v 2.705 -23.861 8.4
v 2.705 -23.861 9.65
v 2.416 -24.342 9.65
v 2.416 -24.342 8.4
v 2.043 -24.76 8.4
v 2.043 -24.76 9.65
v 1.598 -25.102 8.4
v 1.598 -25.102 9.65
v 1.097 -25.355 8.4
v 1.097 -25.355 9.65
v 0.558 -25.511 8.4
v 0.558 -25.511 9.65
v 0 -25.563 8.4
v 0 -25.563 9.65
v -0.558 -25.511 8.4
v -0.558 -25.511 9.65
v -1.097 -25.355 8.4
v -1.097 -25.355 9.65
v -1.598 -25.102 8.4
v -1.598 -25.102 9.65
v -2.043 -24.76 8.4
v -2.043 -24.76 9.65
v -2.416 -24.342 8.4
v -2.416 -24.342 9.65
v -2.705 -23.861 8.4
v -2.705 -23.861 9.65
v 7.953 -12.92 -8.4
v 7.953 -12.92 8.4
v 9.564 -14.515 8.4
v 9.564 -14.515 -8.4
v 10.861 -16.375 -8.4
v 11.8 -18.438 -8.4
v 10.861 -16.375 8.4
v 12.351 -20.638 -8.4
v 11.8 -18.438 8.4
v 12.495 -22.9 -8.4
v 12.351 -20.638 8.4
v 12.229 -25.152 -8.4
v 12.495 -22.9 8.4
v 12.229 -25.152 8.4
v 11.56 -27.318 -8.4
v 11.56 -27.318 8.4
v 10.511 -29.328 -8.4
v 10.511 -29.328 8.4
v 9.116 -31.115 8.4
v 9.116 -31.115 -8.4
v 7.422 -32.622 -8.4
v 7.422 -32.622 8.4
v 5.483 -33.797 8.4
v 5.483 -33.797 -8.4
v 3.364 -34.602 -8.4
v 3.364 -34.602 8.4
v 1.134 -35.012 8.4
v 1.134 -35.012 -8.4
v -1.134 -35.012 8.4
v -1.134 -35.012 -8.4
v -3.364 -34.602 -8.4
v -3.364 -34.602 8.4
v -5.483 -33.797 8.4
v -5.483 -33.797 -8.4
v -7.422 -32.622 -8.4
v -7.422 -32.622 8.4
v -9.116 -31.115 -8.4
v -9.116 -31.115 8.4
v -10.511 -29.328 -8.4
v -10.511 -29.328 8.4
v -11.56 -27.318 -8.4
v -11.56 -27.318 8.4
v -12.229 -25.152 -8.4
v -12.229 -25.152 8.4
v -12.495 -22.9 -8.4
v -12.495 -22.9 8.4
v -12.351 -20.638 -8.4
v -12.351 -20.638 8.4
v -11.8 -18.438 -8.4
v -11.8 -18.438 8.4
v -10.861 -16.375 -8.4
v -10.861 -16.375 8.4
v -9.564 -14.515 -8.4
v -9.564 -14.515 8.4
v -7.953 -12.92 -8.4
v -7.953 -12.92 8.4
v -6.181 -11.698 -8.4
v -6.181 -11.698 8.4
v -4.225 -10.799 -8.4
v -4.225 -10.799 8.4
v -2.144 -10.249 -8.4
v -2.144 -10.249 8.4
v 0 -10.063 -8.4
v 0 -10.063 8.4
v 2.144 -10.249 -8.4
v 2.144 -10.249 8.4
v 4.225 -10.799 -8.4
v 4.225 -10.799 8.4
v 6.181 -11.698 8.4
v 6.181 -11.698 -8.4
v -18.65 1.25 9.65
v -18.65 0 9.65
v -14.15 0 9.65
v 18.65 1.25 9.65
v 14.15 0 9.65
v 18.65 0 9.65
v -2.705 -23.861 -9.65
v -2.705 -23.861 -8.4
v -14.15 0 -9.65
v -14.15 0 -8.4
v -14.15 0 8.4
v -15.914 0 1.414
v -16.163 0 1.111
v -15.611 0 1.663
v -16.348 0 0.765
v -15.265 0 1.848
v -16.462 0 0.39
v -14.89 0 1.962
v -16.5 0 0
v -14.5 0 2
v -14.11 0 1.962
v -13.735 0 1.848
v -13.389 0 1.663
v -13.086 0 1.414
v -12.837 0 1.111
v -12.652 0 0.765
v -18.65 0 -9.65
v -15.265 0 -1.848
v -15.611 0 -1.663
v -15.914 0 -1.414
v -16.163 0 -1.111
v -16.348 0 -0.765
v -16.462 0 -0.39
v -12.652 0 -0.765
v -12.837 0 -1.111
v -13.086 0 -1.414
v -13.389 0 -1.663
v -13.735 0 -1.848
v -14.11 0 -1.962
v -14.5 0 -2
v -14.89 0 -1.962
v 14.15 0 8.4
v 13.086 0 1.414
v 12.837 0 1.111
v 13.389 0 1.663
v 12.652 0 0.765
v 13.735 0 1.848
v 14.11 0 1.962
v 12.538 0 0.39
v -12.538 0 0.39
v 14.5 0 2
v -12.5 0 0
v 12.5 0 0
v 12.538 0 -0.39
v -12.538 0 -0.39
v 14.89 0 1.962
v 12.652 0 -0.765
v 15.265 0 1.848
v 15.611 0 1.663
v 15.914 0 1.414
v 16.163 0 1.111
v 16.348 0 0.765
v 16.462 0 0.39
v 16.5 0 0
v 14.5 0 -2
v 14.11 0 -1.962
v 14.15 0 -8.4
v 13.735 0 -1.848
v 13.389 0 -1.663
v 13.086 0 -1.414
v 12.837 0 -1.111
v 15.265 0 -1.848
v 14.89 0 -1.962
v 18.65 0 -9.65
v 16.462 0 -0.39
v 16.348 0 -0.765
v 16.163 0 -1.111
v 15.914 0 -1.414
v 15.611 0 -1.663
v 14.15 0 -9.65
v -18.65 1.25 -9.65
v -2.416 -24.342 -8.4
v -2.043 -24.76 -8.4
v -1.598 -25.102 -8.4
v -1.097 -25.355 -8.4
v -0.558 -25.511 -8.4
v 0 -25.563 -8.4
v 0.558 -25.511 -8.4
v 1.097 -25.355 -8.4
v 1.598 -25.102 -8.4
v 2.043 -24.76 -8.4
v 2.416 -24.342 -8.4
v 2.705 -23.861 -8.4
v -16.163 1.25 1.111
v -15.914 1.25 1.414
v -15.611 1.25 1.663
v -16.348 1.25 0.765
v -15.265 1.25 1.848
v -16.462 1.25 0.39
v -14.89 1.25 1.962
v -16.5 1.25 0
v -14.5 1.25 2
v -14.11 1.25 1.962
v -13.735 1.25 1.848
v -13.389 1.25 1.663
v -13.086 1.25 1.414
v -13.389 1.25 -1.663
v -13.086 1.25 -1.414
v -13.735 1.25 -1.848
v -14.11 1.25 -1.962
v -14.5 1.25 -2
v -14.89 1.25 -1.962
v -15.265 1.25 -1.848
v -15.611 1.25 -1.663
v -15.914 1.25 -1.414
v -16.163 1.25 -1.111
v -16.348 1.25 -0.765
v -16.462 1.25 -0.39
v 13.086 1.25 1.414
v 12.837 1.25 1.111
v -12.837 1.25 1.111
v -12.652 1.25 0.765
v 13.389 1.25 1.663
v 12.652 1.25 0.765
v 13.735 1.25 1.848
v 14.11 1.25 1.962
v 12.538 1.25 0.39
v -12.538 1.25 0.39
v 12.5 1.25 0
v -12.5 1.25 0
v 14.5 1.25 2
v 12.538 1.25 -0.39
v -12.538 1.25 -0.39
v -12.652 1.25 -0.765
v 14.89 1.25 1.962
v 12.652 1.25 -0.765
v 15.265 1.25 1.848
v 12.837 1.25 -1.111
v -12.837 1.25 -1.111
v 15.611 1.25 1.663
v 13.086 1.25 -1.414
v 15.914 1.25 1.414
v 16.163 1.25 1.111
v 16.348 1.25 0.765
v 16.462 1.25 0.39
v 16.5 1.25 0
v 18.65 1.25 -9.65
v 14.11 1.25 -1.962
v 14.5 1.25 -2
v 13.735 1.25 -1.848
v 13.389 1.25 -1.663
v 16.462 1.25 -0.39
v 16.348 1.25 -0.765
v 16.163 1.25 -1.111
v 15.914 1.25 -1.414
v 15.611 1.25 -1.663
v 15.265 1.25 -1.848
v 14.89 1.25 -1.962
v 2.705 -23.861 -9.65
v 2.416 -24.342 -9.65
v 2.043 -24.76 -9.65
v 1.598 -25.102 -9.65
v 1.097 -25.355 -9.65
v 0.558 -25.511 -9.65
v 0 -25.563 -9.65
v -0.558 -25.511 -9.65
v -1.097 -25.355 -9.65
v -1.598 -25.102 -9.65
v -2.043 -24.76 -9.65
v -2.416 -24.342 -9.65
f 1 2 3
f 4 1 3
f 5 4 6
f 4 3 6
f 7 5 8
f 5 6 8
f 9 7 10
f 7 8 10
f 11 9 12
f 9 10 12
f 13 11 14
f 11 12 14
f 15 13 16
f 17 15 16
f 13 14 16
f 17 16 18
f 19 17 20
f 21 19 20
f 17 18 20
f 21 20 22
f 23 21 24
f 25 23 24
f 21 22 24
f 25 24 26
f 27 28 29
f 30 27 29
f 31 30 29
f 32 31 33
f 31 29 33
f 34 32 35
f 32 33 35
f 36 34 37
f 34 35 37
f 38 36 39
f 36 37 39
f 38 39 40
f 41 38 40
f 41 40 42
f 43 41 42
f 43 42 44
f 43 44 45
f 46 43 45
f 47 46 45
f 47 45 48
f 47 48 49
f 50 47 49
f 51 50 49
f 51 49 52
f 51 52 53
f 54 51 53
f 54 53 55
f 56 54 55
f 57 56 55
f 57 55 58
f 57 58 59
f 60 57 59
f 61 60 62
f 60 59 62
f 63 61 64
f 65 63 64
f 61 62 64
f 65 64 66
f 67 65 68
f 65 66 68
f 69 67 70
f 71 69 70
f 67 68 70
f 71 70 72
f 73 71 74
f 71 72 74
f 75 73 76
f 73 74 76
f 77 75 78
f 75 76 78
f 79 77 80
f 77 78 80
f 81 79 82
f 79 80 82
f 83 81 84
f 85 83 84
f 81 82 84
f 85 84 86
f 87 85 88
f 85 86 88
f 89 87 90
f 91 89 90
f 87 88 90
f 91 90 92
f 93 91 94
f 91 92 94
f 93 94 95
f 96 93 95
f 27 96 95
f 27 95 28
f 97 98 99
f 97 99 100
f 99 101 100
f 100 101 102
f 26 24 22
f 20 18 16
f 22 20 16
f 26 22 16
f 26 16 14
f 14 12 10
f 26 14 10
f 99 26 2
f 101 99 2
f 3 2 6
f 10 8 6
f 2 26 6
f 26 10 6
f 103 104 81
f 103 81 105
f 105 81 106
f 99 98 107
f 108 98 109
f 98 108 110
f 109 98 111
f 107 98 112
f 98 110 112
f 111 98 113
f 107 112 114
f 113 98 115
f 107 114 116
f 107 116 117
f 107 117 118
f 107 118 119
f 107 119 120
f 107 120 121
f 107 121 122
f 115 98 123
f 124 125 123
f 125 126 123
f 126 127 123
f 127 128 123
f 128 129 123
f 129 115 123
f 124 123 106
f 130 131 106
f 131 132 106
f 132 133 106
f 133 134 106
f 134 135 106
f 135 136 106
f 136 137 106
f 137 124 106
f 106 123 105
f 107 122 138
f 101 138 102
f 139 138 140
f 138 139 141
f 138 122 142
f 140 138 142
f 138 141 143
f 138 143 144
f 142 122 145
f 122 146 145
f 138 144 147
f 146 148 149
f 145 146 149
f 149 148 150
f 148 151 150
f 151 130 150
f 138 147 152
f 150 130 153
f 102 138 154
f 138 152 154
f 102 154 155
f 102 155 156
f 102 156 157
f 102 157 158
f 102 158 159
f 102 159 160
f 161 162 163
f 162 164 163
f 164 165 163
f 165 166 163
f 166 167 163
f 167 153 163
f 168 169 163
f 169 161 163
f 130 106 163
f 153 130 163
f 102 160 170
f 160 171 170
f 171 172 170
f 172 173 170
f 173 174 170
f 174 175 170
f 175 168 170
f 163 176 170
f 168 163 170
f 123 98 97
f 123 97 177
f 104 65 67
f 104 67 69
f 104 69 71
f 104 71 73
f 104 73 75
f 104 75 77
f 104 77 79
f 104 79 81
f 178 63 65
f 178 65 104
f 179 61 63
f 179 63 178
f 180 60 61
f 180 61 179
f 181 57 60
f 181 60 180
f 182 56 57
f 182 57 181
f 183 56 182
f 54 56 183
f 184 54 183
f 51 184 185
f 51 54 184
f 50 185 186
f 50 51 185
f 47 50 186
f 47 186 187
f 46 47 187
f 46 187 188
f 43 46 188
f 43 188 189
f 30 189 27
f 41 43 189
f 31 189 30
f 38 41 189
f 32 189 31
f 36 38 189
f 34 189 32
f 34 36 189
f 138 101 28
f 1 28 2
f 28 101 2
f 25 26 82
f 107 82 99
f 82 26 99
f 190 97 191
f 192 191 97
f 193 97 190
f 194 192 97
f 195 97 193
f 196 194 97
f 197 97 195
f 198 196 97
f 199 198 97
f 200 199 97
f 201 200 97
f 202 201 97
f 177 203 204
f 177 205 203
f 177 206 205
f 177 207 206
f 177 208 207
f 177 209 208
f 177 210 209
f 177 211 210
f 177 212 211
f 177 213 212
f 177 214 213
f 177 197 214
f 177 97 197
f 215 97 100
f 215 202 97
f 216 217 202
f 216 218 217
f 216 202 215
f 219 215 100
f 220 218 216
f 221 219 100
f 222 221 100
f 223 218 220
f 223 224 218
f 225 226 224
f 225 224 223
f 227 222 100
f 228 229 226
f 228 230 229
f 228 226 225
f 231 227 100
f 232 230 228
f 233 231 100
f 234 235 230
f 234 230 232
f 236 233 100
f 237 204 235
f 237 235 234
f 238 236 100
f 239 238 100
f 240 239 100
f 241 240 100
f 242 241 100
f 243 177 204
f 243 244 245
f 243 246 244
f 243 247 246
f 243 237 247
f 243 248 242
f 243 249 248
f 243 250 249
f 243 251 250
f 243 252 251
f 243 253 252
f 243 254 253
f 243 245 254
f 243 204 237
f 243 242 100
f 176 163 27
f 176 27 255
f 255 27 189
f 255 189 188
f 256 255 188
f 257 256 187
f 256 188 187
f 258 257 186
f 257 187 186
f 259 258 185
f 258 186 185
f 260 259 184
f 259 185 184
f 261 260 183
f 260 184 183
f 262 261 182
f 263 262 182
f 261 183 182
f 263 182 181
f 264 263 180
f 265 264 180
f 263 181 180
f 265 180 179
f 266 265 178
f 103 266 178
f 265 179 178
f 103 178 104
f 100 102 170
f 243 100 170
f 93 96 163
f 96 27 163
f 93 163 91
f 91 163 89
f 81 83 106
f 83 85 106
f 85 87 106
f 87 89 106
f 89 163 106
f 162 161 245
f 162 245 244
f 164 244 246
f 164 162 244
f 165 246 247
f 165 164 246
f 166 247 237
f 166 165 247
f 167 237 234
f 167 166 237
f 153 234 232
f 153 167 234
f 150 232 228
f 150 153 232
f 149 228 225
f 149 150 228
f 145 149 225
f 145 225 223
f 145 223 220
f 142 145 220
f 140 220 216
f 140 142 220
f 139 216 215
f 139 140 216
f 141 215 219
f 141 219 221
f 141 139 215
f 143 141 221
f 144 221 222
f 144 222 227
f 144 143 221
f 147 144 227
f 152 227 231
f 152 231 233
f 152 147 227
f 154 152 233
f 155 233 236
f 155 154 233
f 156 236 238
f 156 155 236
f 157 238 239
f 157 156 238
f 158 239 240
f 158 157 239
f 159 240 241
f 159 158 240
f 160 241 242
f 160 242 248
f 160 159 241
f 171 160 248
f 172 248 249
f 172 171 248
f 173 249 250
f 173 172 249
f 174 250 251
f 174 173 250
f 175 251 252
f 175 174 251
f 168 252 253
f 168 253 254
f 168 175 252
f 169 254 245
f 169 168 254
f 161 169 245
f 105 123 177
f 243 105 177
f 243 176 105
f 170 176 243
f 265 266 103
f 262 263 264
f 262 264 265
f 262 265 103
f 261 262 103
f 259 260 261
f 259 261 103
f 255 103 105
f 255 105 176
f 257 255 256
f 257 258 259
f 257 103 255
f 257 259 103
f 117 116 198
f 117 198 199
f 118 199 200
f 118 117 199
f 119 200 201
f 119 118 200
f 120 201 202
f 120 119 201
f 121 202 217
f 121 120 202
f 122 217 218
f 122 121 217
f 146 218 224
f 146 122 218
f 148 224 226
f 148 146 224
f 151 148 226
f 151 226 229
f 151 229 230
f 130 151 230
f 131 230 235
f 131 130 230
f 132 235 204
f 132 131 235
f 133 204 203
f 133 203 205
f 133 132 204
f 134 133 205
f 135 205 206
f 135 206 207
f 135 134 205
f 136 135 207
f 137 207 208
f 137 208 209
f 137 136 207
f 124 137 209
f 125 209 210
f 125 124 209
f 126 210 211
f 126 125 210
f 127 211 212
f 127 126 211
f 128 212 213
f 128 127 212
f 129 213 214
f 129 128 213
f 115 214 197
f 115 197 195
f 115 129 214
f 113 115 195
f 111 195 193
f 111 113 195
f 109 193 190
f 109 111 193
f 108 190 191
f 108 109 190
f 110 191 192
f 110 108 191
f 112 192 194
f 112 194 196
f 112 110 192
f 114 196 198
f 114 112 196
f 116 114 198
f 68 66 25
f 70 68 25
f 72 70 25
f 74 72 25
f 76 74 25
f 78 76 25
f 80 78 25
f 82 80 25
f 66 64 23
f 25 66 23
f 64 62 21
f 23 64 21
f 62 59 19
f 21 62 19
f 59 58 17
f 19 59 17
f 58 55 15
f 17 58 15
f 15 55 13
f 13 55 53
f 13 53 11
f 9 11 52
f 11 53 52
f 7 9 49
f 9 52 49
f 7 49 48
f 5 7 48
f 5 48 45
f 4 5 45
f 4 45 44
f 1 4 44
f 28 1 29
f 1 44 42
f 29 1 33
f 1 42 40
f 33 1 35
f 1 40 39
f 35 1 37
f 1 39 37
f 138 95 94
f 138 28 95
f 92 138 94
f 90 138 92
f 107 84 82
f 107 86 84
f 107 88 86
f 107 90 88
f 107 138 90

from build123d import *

# Parameters (mm, degrees)
SKETCH1_W           = 37.3
SKETCH1_H           = 19.3
SKETCH1_R           = 2
BOSS_EXTRUDE1_DEPTH = 1.25
BOSS_EXTRUDE2_DEPTH = 1.25
BOSS_EXTRUDE3_START = -18.05
BOSS_EXTRUDE3_DEPTH = 1.25
SKETCH3_R           = 12.5
BOSS_EXTRUDE4_DEPTH = 16.8


with BuildPart() as part:
    # Sketch1 → Boss-Extrude1 (new body)
    with BuildSketch(Plane(origin=(0, 0, 0), x_dir=(1, 0, 0), z_dir=(0, 1, 0))):
        Rectangle(SKETCH1_W, SKETCH1_H)
        with Locations(Location((-14.5, 0, 0), (0, 0, 270))):
            Circle(SKETCH1_R, mode=Mode.SUBTRACT)
        with Locations(Location((14.5, 0, 0), (0, 0, 90))):
            Circle(SKETCH1_R, mode=Mode.SUBTRACT)
    extrude(amount=BOSS_EXTRUDE1_DEPTH)

    # Sketch2 → Boss-Extrude2 (add)
    with BuildSketch(Plane.XY.offset(9.65)):
        with BuildLine():
            Line((-14.15, 0), (14.15, 0))
            Line((14.15, 0), (2.704926778, -23.860753361))
            ThreePointArc((2.704926778, -23.860753361), (0, -25.563305432), (-2.704926778, -23.860753361))
            Line((-2.704926778, -23.860753361), (-14.15, 0))
        make_face()
    extrude(amount=-BOSS_EXTRUDE2_DEPTH)

    # Sketch2<2> → Boss-Extrude3 (add)
    with BuildSketch(Plane.XY.offset(9.65).offset(BOSS_EXTRUDE3_START)):
        with BuildLine():
            Line((-14.15, 0), (14.15, 0))
            Line((14.15, 0), (2.704926778, -23.860753361))
            ThreePointArc((2.704926778, -23.860753361), (0, -25.563305432), (-2.704926778, -23.860753361))
            Line((-2.704926778, -23.860753361), (-14.15, 0))
        make_face()
    extrude(amount=-BOSS_EXTRUDE3_DEPTH)

    # Sketch3 → Boss-Extrude4 (add)
    with BuildSketch(Plane(origin=(0, 0, 8.4), x_dir=(-1, 0, 0), z_dir=(0, 0, -1))):
        with Locations(Location((0, -22.563305432, 0), (0, 0, 129.511758747))):
            Circle(SKETCH3_R)
    extrude(amount=BOSS_EXTRUDE4_DEPTH)


solid = part.part
